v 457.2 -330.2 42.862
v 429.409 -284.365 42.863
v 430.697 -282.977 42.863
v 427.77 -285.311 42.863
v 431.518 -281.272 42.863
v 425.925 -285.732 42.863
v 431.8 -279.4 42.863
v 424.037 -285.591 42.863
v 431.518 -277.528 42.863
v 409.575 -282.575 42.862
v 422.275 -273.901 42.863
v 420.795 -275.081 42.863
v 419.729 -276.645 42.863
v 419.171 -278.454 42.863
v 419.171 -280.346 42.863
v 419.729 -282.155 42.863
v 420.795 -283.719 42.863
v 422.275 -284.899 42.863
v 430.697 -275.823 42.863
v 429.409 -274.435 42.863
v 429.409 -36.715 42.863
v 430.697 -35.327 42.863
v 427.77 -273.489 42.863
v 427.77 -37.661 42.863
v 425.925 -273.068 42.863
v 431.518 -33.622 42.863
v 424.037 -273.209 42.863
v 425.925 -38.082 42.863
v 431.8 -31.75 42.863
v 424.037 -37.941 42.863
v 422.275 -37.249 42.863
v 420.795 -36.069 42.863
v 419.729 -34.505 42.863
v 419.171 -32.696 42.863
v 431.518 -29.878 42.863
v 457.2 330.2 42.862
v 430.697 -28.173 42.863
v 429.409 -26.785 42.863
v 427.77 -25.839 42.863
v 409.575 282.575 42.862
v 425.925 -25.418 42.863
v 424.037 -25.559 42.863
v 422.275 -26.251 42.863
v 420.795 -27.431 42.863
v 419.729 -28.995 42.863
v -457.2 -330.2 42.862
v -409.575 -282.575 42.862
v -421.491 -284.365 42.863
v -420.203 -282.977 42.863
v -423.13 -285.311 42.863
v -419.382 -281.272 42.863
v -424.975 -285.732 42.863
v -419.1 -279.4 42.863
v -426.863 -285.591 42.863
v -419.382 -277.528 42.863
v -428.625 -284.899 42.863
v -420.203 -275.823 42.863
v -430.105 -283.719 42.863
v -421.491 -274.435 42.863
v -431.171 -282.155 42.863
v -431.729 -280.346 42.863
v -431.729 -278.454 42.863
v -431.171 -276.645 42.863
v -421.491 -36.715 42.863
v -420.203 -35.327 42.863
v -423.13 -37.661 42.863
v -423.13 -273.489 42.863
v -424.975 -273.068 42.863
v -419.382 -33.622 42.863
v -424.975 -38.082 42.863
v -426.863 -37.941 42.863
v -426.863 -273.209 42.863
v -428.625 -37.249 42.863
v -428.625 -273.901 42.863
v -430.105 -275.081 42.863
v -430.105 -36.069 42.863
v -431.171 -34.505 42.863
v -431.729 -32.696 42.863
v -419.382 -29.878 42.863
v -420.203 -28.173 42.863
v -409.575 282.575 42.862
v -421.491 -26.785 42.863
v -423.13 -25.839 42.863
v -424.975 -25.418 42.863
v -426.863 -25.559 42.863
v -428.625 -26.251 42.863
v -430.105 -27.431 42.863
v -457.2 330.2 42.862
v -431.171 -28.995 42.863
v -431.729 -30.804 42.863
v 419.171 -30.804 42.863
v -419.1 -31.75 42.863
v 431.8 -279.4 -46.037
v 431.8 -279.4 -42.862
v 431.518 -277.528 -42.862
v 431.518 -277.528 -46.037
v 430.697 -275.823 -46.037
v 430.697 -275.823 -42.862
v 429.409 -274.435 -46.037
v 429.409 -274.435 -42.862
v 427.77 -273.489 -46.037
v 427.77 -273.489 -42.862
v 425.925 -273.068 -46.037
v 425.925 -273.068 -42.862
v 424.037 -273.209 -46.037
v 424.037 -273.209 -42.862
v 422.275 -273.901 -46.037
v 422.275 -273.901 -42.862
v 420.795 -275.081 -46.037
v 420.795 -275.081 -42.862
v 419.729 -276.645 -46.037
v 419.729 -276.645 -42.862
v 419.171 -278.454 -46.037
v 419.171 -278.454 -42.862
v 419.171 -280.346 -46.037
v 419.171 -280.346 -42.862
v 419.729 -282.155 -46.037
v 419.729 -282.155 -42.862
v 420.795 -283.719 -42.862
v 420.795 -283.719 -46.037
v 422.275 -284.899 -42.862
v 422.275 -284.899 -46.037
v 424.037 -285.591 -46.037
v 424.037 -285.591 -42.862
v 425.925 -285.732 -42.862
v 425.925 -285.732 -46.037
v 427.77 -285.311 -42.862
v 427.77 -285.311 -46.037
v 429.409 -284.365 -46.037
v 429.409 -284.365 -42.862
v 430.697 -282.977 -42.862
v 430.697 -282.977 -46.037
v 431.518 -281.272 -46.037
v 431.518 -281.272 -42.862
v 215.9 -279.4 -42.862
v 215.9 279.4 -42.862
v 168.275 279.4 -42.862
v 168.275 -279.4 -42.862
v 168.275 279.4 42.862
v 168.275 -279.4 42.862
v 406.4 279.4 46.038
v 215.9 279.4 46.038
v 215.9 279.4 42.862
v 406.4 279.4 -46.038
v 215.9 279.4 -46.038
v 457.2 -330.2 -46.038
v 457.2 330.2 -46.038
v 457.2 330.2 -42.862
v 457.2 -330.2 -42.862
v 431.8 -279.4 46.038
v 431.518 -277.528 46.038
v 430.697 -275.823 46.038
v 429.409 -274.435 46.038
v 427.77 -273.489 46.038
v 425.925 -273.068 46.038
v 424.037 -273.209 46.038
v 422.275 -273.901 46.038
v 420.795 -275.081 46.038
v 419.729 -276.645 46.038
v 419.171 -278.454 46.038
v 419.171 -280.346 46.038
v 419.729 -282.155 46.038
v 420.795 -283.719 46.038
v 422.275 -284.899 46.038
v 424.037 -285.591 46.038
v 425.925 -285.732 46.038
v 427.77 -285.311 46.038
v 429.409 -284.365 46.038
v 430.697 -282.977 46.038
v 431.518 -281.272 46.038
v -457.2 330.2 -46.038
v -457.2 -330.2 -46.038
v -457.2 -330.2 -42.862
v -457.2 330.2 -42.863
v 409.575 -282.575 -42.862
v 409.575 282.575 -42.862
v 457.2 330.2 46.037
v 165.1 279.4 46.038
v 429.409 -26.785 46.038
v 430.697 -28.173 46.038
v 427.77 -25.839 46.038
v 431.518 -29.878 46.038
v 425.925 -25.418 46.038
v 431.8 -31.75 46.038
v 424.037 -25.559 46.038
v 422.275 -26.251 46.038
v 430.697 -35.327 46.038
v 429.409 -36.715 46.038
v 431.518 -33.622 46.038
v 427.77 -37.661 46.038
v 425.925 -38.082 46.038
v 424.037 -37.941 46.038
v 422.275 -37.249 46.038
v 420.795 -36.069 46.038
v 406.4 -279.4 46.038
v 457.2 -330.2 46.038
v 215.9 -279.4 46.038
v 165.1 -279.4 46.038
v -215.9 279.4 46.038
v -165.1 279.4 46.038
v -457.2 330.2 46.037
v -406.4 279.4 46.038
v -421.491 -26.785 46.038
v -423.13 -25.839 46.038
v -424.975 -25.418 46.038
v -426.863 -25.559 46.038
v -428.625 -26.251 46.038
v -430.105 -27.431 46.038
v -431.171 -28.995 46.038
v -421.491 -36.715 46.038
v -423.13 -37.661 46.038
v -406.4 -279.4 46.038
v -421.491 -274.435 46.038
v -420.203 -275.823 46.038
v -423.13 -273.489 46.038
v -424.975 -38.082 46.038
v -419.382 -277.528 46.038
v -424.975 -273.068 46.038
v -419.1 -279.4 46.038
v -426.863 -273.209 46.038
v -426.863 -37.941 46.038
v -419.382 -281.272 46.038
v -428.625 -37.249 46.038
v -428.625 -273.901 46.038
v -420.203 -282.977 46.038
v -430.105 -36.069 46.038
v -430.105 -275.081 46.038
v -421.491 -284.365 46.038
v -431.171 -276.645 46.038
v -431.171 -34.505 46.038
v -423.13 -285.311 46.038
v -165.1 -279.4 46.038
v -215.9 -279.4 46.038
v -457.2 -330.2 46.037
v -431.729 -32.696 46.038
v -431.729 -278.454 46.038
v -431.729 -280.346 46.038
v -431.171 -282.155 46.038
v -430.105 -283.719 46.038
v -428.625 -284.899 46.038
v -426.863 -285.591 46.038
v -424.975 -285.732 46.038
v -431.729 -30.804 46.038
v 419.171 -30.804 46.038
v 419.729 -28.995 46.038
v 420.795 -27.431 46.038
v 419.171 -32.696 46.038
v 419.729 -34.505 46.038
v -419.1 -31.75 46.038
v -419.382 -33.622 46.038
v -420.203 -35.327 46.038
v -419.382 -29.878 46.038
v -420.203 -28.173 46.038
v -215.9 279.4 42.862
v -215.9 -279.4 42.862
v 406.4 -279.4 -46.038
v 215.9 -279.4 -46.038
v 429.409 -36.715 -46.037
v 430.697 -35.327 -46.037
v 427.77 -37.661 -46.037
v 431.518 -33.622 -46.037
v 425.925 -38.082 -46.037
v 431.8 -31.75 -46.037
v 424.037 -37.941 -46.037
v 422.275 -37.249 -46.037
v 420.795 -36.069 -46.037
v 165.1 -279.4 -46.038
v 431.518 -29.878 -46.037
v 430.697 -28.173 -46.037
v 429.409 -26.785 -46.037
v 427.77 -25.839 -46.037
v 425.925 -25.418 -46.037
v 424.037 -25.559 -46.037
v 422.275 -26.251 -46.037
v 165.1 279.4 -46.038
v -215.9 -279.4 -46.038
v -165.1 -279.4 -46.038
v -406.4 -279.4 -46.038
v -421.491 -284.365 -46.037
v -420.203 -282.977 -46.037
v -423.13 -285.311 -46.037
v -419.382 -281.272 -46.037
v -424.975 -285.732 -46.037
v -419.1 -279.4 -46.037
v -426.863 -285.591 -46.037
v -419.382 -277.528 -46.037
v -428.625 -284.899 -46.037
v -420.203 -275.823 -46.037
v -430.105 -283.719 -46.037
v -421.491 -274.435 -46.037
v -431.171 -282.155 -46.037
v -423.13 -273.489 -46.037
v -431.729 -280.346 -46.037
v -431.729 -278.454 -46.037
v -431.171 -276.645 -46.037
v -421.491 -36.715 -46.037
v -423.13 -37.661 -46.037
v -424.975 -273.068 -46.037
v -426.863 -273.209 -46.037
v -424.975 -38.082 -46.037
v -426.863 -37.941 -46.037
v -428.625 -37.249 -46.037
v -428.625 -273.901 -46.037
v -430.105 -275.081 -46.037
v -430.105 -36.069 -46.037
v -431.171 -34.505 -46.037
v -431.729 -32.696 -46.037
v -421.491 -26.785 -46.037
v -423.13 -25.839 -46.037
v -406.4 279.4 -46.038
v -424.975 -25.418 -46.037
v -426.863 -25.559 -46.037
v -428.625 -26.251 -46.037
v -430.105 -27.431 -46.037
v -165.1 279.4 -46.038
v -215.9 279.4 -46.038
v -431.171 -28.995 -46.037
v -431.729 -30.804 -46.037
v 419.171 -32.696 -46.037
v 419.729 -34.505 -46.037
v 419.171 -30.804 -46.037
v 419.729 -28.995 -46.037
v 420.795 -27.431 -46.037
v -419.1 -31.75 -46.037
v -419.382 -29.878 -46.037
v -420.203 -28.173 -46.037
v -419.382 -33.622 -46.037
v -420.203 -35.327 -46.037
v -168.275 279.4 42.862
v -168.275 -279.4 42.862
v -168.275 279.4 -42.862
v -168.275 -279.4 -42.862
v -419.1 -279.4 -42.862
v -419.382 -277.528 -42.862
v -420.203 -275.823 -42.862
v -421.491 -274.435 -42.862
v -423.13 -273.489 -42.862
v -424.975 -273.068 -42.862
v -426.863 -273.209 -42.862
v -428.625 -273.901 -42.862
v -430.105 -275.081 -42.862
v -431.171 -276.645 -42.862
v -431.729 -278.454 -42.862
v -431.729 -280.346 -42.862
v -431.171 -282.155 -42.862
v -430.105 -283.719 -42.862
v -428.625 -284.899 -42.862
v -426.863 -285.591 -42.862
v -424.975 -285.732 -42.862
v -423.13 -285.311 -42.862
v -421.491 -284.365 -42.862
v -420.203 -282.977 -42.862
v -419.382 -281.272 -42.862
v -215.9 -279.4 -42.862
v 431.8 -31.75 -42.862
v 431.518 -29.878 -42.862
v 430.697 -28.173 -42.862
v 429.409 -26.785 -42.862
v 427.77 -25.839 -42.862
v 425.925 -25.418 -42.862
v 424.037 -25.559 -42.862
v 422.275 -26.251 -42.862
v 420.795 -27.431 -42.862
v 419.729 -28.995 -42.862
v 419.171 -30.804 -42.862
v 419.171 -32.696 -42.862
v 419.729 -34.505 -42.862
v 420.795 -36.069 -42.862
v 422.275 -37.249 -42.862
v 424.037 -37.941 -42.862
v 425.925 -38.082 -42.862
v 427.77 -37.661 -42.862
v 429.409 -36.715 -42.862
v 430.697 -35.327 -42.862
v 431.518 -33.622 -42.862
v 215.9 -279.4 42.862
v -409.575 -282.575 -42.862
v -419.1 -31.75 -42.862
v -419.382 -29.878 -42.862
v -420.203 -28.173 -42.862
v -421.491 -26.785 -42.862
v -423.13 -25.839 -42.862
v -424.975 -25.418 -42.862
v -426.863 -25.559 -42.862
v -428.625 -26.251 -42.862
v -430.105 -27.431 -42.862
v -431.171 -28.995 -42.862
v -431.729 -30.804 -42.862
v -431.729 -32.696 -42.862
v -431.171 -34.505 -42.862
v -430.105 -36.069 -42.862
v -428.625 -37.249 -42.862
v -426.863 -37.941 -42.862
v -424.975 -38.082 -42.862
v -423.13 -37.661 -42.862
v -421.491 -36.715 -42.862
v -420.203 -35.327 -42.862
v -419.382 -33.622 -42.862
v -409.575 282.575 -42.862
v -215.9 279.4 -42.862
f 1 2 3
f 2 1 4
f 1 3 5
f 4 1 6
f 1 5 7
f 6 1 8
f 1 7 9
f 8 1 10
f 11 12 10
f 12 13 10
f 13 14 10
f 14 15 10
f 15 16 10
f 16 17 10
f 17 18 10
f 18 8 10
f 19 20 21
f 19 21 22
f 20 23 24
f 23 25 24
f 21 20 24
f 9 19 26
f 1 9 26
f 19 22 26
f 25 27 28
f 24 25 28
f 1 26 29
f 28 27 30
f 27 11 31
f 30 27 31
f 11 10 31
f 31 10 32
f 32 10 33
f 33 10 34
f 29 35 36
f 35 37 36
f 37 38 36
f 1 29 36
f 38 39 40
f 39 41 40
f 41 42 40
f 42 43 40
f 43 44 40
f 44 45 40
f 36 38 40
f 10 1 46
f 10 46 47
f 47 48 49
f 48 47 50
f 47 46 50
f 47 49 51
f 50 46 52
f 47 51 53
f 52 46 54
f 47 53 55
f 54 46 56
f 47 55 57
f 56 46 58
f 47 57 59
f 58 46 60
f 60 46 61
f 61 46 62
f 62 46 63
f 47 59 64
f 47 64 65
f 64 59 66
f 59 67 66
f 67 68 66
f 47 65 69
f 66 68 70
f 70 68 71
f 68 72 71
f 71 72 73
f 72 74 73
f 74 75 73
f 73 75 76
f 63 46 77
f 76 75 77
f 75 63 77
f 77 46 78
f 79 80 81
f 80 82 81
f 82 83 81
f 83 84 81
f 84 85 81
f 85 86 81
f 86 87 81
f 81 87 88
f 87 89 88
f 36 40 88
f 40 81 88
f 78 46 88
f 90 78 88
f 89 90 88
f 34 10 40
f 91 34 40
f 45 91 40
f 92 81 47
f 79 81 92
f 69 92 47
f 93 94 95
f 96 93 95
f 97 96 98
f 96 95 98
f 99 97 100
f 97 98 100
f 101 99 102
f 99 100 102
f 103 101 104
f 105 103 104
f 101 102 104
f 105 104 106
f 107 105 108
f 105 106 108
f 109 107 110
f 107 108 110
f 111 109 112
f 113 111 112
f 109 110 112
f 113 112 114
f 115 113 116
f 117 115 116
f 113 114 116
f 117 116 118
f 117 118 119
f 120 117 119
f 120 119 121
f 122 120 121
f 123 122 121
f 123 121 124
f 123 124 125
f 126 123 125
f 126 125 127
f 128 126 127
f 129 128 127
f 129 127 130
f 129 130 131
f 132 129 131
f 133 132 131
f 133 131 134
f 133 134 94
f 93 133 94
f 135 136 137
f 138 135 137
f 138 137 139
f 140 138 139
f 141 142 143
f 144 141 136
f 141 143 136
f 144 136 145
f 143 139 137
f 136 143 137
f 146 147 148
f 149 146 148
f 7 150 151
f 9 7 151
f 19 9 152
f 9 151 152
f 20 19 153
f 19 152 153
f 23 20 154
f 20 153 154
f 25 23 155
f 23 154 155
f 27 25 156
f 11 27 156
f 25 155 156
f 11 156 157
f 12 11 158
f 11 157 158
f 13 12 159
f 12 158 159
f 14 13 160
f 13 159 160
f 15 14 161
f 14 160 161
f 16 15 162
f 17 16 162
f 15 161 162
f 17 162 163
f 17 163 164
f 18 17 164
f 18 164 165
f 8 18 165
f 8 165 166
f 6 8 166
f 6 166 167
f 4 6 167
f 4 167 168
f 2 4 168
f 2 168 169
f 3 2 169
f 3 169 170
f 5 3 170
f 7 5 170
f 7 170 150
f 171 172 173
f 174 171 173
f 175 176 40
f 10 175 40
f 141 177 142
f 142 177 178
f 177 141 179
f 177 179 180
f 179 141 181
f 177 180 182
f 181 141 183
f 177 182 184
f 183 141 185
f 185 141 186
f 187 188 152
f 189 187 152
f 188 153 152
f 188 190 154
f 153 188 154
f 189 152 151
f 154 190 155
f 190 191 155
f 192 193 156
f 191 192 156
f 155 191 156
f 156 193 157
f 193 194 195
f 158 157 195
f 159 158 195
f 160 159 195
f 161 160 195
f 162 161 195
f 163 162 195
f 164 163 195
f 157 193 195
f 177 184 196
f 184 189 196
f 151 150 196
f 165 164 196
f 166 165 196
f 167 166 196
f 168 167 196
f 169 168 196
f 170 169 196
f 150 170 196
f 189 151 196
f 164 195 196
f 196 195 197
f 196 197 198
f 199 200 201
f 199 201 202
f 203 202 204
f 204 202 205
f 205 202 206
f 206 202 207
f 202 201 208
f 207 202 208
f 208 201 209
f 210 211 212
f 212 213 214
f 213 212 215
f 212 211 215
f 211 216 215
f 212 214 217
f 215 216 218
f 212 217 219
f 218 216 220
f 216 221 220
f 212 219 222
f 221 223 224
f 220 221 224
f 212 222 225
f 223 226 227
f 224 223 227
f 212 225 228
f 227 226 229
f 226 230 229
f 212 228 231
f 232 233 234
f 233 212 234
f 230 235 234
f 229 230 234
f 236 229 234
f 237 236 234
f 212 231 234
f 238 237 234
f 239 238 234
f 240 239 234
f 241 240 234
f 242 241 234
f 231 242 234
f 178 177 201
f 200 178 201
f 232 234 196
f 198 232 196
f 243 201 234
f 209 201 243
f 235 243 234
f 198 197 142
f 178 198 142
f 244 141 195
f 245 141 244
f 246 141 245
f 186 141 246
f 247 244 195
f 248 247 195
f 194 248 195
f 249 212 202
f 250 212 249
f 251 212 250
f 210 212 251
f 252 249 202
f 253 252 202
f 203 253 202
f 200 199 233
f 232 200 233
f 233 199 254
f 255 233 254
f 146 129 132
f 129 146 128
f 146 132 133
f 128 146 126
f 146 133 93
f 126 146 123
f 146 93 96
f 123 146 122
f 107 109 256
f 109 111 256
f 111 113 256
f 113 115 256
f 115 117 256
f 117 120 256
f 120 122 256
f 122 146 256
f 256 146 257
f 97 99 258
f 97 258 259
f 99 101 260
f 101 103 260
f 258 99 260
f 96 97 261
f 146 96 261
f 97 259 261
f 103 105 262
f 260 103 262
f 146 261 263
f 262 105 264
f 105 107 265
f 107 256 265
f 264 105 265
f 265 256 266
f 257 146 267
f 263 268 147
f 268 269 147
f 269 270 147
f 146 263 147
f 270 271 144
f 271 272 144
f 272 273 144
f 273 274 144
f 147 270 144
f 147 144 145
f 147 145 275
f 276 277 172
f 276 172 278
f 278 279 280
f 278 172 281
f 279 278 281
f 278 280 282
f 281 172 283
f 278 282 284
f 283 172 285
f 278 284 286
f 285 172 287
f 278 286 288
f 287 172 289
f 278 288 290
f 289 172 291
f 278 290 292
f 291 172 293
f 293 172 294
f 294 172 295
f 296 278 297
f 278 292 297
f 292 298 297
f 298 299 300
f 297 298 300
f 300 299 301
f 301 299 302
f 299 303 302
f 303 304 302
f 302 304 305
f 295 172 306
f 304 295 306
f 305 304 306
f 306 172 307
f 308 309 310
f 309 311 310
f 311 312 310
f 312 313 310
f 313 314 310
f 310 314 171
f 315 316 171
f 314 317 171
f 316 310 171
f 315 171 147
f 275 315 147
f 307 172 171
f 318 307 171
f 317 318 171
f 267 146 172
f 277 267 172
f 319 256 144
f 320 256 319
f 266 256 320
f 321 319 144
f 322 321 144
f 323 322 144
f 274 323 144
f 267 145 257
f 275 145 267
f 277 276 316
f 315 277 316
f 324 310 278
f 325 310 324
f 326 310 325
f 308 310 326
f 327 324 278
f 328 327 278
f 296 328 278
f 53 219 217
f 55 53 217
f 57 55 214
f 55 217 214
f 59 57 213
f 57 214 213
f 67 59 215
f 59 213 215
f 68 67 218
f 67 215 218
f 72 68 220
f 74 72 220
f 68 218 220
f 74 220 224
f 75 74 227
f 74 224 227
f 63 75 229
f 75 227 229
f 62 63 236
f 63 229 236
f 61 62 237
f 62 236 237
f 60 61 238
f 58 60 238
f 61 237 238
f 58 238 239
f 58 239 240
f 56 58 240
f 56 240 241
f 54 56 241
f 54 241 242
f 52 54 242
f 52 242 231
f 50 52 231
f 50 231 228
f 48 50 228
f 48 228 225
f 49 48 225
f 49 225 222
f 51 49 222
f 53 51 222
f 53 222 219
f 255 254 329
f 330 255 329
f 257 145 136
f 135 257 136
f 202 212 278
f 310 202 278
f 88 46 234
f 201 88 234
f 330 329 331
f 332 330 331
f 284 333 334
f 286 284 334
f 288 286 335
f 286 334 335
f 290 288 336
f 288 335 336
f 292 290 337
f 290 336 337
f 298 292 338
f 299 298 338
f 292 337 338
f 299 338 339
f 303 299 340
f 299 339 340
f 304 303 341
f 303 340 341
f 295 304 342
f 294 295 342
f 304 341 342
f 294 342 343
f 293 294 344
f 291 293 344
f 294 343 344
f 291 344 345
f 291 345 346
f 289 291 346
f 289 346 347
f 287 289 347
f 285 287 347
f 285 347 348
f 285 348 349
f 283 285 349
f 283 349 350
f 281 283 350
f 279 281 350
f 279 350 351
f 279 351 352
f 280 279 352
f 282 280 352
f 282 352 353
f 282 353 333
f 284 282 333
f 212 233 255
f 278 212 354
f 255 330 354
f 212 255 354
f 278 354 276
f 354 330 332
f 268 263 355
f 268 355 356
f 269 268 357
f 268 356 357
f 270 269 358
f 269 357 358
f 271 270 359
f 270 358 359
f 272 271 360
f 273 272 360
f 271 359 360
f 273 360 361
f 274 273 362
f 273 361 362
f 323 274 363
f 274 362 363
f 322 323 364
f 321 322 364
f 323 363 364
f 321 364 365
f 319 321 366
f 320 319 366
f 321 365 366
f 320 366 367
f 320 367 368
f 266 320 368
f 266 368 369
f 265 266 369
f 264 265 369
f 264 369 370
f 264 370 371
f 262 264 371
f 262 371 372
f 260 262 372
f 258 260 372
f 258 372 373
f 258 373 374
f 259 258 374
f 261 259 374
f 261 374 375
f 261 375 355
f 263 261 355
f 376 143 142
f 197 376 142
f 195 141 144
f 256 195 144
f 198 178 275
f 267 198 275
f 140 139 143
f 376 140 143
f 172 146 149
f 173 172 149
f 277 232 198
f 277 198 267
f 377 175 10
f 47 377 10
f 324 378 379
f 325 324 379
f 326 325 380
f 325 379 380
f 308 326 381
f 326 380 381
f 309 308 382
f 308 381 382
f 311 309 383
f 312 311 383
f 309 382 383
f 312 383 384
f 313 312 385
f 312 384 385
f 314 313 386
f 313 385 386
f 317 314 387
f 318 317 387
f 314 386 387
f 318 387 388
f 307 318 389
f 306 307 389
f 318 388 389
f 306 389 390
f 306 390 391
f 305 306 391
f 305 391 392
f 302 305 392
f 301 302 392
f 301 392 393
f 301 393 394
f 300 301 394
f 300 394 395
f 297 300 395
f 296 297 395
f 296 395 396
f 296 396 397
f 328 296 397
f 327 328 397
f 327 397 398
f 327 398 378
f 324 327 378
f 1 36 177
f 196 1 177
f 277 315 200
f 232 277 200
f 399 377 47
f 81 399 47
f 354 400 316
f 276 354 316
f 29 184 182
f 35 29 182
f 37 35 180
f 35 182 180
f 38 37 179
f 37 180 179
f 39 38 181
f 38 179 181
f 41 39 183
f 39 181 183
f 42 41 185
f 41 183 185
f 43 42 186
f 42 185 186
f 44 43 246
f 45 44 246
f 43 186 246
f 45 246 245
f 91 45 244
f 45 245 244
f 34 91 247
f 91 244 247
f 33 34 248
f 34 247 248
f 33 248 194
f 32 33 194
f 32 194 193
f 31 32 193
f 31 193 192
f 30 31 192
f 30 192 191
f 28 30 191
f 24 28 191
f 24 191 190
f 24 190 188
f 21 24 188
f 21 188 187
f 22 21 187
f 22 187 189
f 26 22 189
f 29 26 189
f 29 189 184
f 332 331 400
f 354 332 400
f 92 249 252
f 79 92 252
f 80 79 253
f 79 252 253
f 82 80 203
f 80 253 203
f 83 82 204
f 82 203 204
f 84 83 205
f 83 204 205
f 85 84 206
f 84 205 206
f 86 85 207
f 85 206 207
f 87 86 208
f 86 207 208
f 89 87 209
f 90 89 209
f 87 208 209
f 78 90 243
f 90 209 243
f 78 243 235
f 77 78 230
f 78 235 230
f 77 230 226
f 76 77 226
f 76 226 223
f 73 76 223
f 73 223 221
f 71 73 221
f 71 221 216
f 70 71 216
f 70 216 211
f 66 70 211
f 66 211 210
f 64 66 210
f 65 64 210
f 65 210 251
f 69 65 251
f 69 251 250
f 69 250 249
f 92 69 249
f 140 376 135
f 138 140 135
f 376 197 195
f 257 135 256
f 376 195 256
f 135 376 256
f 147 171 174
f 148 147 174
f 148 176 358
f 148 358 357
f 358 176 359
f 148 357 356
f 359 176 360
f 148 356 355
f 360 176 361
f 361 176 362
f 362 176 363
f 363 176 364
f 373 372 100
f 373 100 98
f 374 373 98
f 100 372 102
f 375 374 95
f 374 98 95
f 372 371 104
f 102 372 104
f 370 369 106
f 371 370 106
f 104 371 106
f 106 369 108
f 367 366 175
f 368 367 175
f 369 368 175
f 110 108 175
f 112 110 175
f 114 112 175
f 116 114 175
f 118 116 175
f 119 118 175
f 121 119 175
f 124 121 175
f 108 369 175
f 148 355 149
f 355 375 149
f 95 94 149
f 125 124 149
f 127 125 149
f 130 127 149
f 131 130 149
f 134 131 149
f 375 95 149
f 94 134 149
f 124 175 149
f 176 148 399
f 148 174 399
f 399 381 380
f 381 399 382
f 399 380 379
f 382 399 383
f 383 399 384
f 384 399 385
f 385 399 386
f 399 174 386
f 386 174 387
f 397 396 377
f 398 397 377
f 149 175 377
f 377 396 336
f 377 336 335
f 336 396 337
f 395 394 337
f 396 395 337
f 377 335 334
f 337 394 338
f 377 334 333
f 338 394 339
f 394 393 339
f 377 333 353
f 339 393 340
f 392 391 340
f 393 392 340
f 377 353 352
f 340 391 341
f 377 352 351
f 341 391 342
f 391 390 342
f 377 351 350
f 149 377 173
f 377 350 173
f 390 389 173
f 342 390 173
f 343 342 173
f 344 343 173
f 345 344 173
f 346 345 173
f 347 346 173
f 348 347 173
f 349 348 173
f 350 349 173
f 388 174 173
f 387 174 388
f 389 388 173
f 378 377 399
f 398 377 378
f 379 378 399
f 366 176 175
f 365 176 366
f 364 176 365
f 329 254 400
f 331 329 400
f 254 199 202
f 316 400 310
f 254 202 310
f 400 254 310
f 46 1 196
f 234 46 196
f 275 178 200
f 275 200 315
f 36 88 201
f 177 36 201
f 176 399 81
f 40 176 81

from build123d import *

# Parameters (mm, degrees)
F4_DEPTH = 558.8
F5_R     = 6.35
F6_DEPTH = 92.076


with BuildPart() as f2:
    # F2: sweep along a path in F0
    with BuildLine(Plane.XY) as f2_path:
        Line((406.4, 279.4), (-406.4, 279.4))
        Line((-406.4, 279.4), (-406.4, -279.4))
        Line((-406.4, -279.4), (406.4, -279.4))
        Line((406.4, -279.4), (406.4, 279.4))
    # F1 (on Front) → F2 (sweep)
    with BuildSketch(Plane.XZ):
        Polygon((406.4, 46.0375), (406.4, 0), (406.4, -46.0375), (457.2, -46.0375), (457.2, -42.8625), (409.575, -42.8625), (409.575, 42.8625), (457.2, 42.8625), (457.2, 46.0375), align=None)
    sweep(path=f2_path.line, transition=Transition.RIGHT)

    # F3 (on face) → F4 (join, through all)
    with BuildSketch(Plane.XZ.offset(-279.4)):
        Polygon((-165.1, 46.0375), (-215.9, 46.0375), (-215.9, 42.8625), (-168.275, 42.8625), (-168.275, -42.8625), (-215.9, -42.8625), (-215.9, -46.0375), (-165.1, -46.0375), align=None)
        Polygon((165.1, -46.0375), (215.9, -46.0375), (215.9, -42.8625), (168.275, -42.8625), (168.275, 42.8625), (215.9, 42.8625), (215.9, 46.0375), (165.1, 46.0375), align=None)
    extrude(amount=F4_DEPTH)

    # F5 (on face) → F6 (cut, through all)
    with BuildSketch(Plane.XY.offset(46.0375)):
        with Locations((-425.45, -279.4)):
            Circle(F5_R)
        with Locations((-425.45, -31.75)):
            Circle(F5_R)
        with Locations((425.45, -279.4)):
            Circle(F5_R)
        with Locations((425.45, -31.75)):
            Circle(F5_R)
    extrude(amount=-F6_DEPTH, mode=Mode.SUBTRACT)


solid = f2.part
